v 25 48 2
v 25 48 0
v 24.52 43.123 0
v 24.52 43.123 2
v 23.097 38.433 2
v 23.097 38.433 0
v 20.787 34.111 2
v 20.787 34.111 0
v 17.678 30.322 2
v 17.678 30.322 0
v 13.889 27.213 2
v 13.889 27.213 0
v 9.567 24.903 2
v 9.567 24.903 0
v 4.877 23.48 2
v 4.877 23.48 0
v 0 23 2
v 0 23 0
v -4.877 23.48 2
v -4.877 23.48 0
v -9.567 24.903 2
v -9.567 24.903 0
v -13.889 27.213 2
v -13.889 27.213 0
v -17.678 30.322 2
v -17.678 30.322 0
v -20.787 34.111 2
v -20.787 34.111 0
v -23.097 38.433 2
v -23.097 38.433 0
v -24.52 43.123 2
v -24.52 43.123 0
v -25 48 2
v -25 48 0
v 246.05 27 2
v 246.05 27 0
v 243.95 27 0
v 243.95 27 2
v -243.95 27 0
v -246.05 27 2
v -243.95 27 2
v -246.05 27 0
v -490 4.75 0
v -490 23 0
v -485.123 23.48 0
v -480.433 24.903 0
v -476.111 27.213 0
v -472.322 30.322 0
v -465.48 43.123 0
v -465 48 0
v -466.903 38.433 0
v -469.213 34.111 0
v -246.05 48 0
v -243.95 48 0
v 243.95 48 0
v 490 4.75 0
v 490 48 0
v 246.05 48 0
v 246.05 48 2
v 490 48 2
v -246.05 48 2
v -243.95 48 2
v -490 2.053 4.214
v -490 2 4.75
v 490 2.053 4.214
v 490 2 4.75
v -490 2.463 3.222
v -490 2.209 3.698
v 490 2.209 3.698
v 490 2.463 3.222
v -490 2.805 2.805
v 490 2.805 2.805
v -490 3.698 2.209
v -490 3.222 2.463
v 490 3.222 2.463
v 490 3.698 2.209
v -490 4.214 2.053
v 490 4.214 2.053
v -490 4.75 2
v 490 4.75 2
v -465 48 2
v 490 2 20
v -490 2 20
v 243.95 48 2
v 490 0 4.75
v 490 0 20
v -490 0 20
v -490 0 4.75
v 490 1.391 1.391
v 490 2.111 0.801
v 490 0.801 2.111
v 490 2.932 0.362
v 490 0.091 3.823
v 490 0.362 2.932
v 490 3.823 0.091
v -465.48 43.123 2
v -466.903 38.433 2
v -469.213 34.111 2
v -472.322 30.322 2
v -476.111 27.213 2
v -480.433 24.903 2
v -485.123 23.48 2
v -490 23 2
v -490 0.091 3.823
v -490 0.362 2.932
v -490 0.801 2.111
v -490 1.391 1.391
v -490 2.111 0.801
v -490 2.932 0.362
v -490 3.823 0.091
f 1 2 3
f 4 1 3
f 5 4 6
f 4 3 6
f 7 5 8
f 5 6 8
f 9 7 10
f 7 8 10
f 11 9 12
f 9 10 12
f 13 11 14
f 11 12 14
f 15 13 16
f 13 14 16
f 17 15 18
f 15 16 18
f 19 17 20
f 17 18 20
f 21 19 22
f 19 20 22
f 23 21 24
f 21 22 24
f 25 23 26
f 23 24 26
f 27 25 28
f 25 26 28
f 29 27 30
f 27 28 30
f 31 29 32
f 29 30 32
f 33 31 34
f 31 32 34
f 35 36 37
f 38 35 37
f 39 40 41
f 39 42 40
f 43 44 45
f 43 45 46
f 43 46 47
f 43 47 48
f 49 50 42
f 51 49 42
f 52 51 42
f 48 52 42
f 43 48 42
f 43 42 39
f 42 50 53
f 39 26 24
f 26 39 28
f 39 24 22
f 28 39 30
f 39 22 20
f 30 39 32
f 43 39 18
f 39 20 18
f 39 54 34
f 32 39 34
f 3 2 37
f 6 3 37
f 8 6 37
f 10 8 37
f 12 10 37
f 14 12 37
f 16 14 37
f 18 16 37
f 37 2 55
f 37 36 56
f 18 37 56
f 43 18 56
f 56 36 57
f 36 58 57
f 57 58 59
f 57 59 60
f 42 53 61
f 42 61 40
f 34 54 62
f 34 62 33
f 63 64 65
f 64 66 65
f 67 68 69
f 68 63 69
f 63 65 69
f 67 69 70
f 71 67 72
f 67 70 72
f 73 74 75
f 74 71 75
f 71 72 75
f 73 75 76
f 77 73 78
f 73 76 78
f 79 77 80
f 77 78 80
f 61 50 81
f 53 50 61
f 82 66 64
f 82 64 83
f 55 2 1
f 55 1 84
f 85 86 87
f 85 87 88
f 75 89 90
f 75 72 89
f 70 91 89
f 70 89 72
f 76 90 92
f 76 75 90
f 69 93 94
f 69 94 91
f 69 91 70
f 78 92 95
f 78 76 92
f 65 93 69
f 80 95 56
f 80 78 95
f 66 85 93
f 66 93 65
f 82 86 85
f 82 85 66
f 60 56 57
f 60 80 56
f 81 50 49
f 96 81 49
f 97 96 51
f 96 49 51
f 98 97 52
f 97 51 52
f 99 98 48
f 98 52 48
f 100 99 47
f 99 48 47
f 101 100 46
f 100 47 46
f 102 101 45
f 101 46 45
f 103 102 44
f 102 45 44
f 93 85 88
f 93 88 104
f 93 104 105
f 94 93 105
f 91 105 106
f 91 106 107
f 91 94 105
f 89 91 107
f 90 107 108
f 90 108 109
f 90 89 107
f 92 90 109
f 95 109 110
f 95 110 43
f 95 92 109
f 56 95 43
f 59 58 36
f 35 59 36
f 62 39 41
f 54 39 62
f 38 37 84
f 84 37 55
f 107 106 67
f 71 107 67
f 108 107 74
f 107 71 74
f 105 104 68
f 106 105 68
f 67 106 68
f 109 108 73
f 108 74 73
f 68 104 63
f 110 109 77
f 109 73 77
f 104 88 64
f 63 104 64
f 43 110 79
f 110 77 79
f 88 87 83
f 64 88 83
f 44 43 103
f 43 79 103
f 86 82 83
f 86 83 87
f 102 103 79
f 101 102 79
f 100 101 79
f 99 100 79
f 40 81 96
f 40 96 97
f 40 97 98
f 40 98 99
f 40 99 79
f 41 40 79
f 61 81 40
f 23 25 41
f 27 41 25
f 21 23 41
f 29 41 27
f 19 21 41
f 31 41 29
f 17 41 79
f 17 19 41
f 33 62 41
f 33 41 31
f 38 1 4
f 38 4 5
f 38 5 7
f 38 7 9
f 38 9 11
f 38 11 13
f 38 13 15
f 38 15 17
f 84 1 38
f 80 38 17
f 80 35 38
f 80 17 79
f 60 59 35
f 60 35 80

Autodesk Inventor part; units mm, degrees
ref_plane "YZ Plane" through (0, 0, 0) normal (1, 0, 0) x (0, 1, 0)
ref_plane "XZ Plane" through (0, 0, 0) normal (0, 1, 0) x (-1, 0, 0)
ref_plane "XY Plane" through (0, 0, 0) normal (0, 0, 1) x (1, 0, 0)
sketch "Sketch1" plane through (0, 0, 0) normal (0, 0, 1) x (1, 0, 0)
  line L0 (-490, 48) -> (490, 48)
  line L1 (490, 48) -> (490, 0)
  line L2 (490, 0) -> (-490, 0)
  line L3 (-490, 0) -> (-490, 48)
  point P0 (0, 0)
  point P1 (0, 0)
  dimension "d0" = 980
  dimension "d1" = 48
extrude "Plate1" add sketch "Sketch1" along normal blind 2
sketch "Sketch2" plane through (490, 2, 0) normal (0, -1, 0) x (1, 0, 0)
  line L0 (-980, 0) -> (0, 0)
  line L1 (0, 0) -> (0, 20)
  line L2 (0, 20) -> (-980, 20)
  line L3 (-980, 20) -> (-980, 0)
edge flange "Flange1" height 20 angle 90 thickness 2 bend radius 2.75 thickness toward (0, -1, 0) relief round relief width 2 relief depth 1 edges at (0, 0, 2) wall of the first edge with corners at (-490, 2, 0) (490, 2, 0) (490, 2, 20) (-490, 2, 20)
bend "Bend1"
corner "Corner1"
sketch "Sketch5" plane through (0, 0, 0) normal (0, 0, -1) x (-1, 0, 0)
  line L0 (490, 48) -> (-490, 48) projected
  line L1 (490, 0) -> (-490, 0) projected
  circle A0 centre (0, 48) radius 25
  line L2 (243.95, 48) -> (246.05, 48)
  line L3 (246.05, 48) -> (246.05, 27)
  line L4 (246.05, 27) -> (243.95, 27)
  line L5 (243.95, 27) -> (243.95, 48)
  line L6 (-243.95, 48) -> (-246.05, 48)
  line L7 (-246.05, 48) -> (-246.05, 27)
  line L8 (-246.05, 27) -> (-243.95, 27)
  line L9 (-243.95, 27) -> (-243.95, 48)
  line L10 (0, 48) -> (0, 0) construction
  line L11 (490, 0) -> (490, 48)
  line L12 (-490, 0) -> (-490, 48)
  circle A1 centre (-490, 48) radius 25
  circle A2 centre (490, 48) radius 25
  point P0 (0, 0)
  point P1 (245, 27)
  point P2 (-245, 27)
  point P3 (246.05, 48)
  point P4 (-25, 48)
  point P5 (25, 48)
  point P6 (-246.05, 48)
  point P7 (465, 48)
  point P8 (490, 23)
  point P9 (-490, 23)
  point P10 (-465, 48)
  dimension "d45" = 50
  dimension "d48" = 2.1
  dimension "d49" = 490
  dimension "d51" = 27
  dimension "d52" = 21
extrude "Extrusion1" cut sketch "Sketch5" against normal through all contours L3 L4 L5 L0 | L0 L11 A2 | A0 L0 | L9 L8 L7 L0 picked at (473.5423, 46.1457) picked at (-2.955, 40.2082)
sketch "Sketch9" plane through (0, 0, 2) normal (0, 0, 1) x (1, 0, 0)
  line L0 (480.2878, 24.3045) -> (480.2878, 12.3045) construction
  line L1 (480.2878, 12.3045) -> (280.2878, 12.3045) construction
  line L2 (280.2878, 12.3045) -> (280.2878, 24.3045) construction
  line L3 (280.2878, 24.3045) -> (480.2878, 24.3045) construction
  line L4 (-490, 48) -> (490, 48) projected
  point P0 (0, 0)
  point P1 (1.05, 68)
  point P2 (490, 48)
  point P3 (-490, 48)
  dimension "d40" = 200
  dimension "d41" = 12
mark "Mark2"
equation "\"d2\" = Thickness"
equation "\"d3\" = BendReliefWidth"
equation "\"d4\" = BendReliefDepth"
equation "\"d5\" = MinimumRemnant"
equation "\"d6\" = TransitionRadius"
equation "\"d9\" = BendRadius"
equation "\"d10\" = CornerReliefSize"
equation "\"d11\" = GapSize"
equation "\"d12\" = JacobiRadiusSize"
equation "\"BendReliefWidth\" = Thickness"
equation "\"BendReliefDepth\" = 0.5 * Thickness"
equation "\"CornerReliefSize\" = 4 * Thickness"
equation "\"MinimumRemnant\" = 2 * Thickness"
equation "\"TransitionRadius\" = BendRadius"
equation "\"JacobiRadiusSize\" = BendRadius"
equation "\"GapSize\" = Thickness"
equation "\"Thickness\" = 2"
equation "\"BendRadius\" = 2.75"
properties part number "MSC 325 STRINGER BOARD  ##" material "Stainless Steel"
